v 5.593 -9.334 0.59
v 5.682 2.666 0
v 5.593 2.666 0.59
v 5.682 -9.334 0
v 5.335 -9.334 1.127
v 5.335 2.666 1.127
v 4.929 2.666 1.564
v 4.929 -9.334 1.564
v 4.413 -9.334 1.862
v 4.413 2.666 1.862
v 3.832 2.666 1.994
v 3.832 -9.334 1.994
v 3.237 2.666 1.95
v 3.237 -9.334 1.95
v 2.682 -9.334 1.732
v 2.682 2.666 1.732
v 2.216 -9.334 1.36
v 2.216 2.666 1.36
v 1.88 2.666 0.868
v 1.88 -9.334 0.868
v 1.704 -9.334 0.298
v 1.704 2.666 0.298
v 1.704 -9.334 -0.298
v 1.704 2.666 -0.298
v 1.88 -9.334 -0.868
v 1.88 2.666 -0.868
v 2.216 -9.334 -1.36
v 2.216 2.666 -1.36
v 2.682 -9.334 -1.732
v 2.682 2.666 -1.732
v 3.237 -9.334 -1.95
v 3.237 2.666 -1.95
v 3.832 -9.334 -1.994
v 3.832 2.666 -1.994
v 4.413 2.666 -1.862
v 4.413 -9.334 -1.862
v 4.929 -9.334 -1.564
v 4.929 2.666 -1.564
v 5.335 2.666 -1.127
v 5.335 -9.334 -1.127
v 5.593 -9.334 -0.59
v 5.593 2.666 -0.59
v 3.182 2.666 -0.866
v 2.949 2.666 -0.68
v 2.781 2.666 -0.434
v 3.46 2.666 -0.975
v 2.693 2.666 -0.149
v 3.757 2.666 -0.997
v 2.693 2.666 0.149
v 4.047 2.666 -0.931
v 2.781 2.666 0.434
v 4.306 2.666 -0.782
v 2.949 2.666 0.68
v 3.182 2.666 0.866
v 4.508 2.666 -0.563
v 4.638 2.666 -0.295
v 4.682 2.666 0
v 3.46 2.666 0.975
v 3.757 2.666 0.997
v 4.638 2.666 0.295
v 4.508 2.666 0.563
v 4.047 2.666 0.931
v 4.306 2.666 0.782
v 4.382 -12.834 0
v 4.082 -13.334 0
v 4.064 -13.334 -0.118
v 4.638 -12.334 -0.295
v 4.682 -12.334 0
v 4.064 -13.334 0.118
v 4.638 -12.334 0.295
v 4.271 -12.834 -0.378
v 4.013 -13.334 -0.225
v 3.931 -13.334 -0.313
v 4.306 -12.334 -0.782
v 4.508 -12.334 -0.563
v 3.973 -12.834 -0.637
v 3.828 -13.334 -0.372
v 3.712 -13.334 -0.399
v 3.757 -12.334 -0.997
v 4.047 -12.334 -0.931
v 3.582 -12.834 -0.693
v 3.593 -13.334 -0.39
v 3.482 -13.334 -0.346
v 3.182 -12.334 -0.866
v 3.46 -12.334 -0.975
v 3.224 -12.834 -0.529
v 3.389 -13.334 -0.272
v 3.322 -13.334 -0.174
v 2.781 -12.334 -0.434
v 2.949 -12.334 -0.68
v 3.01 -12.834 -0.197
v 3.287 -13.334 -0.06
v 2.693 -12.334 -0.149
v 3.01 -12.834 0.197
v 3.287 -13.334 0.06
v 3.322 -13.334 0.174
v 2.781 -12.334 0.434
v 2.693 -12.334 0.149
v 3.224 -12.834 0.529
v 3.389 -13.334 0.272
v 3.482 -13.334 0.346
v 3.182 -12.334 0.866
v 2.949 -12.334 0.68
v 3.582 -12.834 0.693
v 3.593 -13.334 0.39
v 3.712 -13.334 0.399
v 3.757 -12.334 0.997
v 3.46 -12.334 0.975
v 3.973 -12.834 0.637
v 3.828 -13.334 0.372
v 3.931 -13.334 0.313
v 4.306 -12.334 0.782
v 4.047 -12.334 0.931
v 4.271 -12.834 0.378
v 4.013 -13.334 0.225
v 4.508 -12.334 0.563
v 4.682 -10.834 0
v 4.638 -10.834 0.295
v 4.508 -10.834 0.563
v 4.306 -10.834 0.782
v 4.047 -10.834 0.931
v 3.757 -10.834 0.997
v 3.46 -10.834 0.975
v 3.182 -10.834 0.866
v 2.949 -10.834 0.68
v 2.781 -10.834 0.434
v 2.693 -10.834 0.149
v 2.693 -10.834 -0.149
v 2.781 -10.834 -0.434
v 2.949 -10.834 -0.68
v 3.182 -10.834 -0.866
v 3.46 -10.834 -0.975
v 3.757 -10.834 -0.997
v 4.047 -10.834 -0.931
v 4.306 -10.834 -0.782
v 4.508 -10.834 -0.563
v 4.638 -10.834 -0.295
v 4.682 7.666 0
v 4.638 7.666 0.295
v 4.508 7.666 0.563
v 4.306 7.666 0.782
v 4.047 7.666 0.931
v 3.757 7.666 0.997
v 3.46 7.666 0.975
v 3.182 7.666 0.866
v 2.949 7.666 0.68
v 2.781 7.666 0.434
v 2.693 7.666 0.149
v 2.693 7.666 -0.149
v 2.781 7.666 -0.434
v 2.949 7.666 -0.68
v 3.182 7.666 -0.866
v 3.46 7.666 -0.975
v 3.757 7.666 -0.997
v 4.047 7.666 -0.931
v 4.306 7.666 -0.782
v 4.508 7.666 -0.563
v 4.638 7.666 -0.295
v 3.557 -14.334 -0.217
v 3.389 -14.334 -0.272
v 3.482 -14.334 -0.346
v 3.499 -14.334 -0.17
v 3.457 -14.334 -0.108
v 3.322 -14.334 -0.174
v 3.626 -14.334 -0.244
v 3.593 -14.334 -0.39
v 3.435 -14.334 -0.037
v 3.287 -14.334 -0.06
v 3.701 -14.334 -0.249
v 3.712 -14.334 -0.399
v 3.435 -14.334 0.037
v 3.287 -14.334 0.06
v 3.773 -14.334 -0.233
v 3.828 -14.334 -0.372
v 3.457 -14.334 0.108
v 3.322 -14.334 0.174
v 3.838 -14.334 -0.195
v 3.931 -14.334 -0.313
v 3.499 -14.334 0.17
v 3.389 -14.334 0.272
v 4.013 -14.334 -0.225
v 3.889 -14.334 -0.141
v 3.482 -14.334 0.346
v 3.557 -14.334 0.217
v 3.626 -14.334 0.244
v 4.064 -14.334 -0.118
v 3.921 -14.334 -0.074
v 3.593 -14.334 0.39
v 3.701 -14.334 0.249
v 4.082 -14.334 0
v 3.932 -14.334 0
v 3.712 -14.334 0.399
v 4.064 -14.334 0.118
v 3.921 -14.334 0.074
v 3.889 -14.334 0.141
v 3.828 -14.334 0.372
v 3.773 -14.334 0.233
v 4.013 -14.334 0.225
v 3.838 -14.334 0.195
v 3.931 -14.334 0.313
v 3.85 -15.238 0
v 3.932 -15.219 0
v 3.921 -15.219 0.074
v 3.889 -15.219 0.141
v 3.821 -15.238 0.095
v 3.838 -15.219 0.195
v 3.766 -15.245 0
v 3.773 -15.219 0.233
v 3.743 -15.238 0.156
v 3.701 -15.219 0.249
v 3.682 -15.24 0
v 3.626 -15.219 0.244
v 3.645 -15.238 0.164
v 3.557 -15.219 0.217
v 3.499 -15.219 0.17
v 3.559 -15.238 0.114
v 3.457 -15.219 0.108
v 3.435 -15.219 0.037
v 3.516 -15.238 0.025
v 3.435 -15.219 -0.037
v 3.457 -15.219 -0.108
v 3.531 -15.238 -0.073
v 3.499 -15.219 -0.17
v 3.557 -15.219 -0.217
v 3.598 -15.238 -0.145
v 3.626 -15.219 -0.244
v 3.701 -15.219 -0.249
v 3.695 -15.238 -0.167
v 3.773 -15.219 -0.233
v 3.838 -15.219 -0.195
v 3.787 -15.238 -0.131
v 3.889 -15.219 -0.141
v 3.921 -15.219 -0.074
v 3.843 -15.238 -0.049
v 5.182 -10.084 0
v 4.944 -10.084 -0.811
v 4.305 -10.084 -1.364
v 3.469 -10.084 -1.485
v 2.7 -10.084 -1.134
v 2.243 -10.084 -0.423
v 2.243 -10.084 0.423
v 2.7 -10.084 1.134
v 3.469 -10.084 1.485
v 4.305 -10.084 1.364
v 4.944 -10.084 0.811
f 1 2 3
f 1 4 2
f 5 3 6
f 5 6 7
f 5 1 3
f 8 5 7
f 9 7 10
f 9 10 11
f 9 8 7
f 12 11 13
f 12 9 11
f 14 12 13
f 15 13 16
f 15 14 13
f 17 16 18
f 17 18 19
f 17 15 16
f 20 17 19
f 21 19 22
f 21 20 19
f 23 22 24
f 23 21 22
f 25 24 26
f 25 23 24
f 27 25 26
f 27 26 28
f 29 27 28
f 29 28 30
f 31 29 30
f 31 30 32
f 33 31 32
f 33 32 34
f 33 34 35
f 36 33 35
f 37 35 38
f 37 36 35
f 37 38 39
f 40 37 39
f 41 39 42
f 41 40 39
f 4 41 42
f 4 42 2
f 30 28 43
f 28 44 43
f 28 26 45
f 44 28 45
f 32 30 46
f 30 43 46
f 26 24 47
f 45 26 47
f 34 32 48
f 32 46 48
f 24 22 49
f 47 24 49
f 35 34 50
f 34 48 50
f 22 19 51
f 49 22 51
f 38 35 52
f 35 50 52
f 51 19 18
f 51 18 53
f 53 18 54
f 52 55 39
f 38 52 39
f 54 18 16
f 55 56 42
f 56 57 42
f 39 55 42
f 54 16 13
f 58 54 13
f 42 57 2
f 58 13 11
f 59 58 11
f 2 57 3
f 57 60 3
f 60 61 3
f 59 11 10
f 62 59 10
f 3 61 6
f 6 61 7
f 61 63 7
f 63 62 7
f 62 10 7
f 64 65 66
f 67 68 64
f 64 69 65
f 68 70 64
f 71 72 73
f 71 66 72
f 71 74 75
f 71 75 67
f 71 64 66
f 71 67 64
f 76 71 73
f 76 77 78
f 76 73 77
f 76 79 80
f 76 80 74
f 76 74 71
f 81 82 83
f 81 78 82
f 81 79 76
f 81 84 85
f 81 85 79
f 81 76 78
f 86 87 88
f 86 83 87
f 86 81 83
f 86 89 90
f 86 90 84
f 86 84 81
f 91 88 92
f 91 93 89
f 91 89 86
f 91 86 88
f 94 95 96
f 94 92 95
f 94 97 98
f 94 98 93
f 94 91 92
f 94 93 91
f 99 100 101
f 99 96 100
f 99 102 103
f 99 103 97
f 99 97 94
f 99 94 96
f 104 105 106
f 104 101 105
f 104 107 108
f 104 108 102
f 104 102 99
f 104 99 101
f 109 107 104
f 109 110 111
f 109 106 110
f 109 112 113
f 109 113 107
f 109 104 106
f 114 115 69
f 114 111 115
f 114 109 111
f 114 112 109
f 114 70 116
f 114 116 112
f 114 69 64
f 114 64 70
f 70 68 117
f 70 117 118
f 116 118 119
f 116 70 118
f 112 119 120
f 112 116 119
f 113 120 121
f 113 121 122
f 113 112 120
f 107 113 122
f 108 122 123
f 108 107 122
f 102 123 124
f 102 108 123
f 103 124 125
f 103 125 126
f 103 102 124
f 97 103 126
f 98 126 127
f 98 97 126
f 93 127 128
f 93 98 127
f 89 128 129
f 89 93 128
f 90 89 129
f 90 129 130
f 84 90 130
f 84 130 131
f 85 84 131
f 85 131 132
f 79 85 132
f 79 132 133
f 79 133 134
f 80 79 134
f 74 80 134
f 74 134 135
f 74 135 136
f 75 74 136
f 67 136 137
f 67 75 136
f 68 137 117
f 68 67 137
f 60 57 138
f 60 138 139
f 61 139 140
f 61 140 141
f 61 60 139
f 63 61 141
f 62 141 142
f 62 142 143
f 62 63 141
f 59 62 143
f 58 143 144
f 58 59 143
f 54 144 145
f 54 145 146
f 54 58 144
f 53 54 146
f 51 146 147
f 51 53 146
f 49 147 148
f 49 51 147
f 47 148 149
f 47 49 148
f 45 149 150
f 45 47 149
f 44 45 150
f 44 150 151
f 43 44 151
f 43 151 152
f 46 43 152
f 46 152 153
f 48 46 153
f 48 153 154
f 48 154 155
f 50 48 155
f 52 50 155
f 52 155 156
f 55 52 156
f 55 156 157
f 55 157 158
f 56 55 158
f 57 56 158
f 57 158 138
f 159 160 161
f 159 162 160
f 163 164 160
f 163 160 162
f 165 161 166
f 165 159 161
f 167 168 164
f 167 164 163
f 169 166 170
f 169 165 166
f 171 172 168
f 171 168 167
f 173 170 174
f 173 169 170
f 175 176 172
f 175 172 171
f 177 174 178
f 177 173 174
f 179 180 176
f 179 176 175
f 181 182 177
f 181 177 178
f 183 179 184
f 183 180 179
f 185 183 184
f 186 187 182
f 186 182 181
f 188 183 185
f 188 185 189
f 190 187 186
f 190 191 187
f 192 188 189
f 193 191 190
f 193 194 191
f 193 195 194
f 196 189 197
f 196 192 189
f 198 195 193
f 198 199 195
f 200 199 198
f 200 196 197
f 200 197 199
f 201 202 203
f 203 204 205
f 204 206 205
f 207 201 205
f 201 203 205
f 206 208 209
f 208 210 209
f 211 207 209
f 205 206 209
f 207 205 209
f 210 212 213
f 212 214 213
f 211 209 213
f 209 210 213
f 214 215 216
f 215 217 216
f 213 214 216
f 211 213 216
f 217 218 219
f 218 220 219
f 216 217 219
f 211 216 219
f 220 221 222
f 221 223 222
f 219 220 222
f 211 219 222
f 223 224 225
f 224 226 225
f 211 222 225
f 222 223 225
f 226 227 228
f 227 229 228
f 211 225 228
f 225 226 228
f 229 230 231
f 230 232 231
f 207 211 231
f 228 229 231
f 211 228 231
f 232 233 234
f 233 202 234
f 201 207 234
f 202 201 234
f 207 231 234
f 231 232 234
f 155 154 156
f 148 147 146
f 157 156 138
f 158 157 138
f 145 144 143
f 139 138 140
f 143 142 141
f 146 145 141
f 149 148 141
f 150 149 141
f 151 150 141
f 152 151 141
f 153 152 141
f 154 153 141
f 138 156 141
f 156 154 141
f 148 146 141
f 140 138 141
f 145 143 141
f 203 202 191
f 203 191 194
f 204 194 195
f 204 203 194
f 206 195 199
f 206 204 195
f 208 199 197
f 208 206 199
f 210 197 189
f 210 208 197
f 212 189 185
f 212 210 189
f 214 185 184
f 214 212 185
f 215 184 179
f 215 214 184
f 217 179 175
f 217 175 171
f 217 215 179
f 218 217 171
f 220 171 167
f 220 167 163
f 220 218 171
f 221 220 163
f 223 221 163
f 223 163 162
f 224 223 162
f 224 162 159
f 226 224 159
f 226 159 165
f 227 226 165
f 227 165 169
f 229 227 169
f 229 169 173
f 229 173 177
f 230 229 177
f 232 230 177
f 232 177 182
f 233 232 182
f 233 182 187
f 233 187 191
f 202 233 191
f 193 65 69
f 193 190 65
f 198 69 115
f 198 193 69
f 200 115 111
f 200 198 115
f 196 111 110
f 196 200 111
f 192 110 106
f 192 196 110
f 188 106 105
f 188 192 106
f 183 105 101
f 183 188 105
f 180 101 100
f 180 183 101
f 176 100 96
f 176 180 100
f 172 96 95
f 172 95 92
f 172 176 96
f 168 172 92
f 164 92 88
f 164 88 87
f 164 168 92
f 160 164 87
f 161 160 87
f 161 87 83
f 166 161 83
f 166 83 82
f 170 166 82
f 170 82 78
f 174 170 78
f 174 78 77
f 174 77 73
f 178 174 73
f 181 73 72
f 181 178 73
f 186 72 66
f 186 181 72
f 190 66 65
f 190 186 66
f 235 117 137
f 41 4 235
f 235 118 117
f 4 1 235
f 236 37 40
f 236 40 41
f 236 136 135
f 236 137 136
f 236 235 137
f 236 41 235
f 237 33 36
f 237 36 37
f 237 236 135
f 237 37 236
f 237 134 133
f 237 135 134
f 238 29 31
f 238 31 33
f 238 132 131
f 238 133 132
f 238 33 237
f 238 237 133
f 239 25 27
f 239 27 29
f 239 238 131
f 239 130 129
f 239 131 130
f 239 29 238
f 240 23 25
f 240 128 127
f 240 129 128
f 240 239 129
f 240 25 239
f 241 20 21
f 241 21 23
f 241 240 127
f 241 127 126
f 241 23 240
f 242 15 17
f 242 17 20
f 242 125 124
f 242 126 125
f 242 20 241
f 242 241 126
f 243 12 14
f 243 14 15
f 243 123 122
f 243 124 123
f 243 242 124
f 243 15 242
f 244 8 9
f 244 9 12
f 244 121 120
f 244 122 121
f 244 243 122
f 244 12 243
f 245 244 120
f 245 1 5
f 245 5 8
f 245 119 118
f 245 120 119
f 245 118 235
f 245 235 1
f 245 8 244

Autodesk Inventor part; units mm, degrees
ref_plane "YZ Plane" through (0, 0, 0) normal (1, 0, 0) x (0, 1, 0)
ref_plane "XZ Plane" through (0, 0, 0) normal (0, 1, 0) x (-1, 0, 0)
ref_plane "XY Plane" through (0, 0, 0) normal (0, 0, 1) x (1, 0, 0)
sketch "Sketch1" plane through (0, 0, 0) normal (0, 0, 1) x (1, 0, 0)
  line L0 (4.6821, 7.6658) -> (4.6821, 2.6658)
  line L1 (4.6821, 2.6658) -> (5.6821, 2.6658)
  line L2 (5.6821, 2.6658) -> (5.6821, -9.3342)
  line L3 (5.6821, -9.3342) -> (4.6821, -10.8342)
  line L4 (4.6821, -10.8342) -> (4.6821, -12.3342)
  line L5 (4.0821, -13.3342) -> (4.0821, -14.3342)
  line L6 (4.6821, -12.3342) -> (4.0821, -13.3342)
  line L7 (3.9321, -14.3342) -> (3.9321, -15.219)
  line L8 (3.6821, 7.6658) -> (3.6821, -15.2399)
  line L9 (4.0821, -14.3342) -> (3.9321, -14.3342)
  arc A0 (3.6821, -15.2399) -> (3.9321, -15.219) centre (3.7576, -14.6374) ccw
  line L10 (4.6821, 7.6658) -> (3.6821, 7.6658)
  point P0 (0, 0)
  dimension "d7" = 5
  dimension "d10" = 12
  dimension "d14" = 1
  dimension "d17" = 1.5
  dimension "d18" = 3
  dimension "d19" = 1
  dimension "d21" = 0.5
  dimension "d22" = 0.8
  dimension "d23" = 2
  dimension "d24" = 4
  dimension "d25" = 2
revolve "Revolution1" add sketch "Sketch1" angle 360 about axis through (3.6821, 7.6658, 0) along (0, -1, 0)
properties material "Nickel-Copper Alloy 400"
